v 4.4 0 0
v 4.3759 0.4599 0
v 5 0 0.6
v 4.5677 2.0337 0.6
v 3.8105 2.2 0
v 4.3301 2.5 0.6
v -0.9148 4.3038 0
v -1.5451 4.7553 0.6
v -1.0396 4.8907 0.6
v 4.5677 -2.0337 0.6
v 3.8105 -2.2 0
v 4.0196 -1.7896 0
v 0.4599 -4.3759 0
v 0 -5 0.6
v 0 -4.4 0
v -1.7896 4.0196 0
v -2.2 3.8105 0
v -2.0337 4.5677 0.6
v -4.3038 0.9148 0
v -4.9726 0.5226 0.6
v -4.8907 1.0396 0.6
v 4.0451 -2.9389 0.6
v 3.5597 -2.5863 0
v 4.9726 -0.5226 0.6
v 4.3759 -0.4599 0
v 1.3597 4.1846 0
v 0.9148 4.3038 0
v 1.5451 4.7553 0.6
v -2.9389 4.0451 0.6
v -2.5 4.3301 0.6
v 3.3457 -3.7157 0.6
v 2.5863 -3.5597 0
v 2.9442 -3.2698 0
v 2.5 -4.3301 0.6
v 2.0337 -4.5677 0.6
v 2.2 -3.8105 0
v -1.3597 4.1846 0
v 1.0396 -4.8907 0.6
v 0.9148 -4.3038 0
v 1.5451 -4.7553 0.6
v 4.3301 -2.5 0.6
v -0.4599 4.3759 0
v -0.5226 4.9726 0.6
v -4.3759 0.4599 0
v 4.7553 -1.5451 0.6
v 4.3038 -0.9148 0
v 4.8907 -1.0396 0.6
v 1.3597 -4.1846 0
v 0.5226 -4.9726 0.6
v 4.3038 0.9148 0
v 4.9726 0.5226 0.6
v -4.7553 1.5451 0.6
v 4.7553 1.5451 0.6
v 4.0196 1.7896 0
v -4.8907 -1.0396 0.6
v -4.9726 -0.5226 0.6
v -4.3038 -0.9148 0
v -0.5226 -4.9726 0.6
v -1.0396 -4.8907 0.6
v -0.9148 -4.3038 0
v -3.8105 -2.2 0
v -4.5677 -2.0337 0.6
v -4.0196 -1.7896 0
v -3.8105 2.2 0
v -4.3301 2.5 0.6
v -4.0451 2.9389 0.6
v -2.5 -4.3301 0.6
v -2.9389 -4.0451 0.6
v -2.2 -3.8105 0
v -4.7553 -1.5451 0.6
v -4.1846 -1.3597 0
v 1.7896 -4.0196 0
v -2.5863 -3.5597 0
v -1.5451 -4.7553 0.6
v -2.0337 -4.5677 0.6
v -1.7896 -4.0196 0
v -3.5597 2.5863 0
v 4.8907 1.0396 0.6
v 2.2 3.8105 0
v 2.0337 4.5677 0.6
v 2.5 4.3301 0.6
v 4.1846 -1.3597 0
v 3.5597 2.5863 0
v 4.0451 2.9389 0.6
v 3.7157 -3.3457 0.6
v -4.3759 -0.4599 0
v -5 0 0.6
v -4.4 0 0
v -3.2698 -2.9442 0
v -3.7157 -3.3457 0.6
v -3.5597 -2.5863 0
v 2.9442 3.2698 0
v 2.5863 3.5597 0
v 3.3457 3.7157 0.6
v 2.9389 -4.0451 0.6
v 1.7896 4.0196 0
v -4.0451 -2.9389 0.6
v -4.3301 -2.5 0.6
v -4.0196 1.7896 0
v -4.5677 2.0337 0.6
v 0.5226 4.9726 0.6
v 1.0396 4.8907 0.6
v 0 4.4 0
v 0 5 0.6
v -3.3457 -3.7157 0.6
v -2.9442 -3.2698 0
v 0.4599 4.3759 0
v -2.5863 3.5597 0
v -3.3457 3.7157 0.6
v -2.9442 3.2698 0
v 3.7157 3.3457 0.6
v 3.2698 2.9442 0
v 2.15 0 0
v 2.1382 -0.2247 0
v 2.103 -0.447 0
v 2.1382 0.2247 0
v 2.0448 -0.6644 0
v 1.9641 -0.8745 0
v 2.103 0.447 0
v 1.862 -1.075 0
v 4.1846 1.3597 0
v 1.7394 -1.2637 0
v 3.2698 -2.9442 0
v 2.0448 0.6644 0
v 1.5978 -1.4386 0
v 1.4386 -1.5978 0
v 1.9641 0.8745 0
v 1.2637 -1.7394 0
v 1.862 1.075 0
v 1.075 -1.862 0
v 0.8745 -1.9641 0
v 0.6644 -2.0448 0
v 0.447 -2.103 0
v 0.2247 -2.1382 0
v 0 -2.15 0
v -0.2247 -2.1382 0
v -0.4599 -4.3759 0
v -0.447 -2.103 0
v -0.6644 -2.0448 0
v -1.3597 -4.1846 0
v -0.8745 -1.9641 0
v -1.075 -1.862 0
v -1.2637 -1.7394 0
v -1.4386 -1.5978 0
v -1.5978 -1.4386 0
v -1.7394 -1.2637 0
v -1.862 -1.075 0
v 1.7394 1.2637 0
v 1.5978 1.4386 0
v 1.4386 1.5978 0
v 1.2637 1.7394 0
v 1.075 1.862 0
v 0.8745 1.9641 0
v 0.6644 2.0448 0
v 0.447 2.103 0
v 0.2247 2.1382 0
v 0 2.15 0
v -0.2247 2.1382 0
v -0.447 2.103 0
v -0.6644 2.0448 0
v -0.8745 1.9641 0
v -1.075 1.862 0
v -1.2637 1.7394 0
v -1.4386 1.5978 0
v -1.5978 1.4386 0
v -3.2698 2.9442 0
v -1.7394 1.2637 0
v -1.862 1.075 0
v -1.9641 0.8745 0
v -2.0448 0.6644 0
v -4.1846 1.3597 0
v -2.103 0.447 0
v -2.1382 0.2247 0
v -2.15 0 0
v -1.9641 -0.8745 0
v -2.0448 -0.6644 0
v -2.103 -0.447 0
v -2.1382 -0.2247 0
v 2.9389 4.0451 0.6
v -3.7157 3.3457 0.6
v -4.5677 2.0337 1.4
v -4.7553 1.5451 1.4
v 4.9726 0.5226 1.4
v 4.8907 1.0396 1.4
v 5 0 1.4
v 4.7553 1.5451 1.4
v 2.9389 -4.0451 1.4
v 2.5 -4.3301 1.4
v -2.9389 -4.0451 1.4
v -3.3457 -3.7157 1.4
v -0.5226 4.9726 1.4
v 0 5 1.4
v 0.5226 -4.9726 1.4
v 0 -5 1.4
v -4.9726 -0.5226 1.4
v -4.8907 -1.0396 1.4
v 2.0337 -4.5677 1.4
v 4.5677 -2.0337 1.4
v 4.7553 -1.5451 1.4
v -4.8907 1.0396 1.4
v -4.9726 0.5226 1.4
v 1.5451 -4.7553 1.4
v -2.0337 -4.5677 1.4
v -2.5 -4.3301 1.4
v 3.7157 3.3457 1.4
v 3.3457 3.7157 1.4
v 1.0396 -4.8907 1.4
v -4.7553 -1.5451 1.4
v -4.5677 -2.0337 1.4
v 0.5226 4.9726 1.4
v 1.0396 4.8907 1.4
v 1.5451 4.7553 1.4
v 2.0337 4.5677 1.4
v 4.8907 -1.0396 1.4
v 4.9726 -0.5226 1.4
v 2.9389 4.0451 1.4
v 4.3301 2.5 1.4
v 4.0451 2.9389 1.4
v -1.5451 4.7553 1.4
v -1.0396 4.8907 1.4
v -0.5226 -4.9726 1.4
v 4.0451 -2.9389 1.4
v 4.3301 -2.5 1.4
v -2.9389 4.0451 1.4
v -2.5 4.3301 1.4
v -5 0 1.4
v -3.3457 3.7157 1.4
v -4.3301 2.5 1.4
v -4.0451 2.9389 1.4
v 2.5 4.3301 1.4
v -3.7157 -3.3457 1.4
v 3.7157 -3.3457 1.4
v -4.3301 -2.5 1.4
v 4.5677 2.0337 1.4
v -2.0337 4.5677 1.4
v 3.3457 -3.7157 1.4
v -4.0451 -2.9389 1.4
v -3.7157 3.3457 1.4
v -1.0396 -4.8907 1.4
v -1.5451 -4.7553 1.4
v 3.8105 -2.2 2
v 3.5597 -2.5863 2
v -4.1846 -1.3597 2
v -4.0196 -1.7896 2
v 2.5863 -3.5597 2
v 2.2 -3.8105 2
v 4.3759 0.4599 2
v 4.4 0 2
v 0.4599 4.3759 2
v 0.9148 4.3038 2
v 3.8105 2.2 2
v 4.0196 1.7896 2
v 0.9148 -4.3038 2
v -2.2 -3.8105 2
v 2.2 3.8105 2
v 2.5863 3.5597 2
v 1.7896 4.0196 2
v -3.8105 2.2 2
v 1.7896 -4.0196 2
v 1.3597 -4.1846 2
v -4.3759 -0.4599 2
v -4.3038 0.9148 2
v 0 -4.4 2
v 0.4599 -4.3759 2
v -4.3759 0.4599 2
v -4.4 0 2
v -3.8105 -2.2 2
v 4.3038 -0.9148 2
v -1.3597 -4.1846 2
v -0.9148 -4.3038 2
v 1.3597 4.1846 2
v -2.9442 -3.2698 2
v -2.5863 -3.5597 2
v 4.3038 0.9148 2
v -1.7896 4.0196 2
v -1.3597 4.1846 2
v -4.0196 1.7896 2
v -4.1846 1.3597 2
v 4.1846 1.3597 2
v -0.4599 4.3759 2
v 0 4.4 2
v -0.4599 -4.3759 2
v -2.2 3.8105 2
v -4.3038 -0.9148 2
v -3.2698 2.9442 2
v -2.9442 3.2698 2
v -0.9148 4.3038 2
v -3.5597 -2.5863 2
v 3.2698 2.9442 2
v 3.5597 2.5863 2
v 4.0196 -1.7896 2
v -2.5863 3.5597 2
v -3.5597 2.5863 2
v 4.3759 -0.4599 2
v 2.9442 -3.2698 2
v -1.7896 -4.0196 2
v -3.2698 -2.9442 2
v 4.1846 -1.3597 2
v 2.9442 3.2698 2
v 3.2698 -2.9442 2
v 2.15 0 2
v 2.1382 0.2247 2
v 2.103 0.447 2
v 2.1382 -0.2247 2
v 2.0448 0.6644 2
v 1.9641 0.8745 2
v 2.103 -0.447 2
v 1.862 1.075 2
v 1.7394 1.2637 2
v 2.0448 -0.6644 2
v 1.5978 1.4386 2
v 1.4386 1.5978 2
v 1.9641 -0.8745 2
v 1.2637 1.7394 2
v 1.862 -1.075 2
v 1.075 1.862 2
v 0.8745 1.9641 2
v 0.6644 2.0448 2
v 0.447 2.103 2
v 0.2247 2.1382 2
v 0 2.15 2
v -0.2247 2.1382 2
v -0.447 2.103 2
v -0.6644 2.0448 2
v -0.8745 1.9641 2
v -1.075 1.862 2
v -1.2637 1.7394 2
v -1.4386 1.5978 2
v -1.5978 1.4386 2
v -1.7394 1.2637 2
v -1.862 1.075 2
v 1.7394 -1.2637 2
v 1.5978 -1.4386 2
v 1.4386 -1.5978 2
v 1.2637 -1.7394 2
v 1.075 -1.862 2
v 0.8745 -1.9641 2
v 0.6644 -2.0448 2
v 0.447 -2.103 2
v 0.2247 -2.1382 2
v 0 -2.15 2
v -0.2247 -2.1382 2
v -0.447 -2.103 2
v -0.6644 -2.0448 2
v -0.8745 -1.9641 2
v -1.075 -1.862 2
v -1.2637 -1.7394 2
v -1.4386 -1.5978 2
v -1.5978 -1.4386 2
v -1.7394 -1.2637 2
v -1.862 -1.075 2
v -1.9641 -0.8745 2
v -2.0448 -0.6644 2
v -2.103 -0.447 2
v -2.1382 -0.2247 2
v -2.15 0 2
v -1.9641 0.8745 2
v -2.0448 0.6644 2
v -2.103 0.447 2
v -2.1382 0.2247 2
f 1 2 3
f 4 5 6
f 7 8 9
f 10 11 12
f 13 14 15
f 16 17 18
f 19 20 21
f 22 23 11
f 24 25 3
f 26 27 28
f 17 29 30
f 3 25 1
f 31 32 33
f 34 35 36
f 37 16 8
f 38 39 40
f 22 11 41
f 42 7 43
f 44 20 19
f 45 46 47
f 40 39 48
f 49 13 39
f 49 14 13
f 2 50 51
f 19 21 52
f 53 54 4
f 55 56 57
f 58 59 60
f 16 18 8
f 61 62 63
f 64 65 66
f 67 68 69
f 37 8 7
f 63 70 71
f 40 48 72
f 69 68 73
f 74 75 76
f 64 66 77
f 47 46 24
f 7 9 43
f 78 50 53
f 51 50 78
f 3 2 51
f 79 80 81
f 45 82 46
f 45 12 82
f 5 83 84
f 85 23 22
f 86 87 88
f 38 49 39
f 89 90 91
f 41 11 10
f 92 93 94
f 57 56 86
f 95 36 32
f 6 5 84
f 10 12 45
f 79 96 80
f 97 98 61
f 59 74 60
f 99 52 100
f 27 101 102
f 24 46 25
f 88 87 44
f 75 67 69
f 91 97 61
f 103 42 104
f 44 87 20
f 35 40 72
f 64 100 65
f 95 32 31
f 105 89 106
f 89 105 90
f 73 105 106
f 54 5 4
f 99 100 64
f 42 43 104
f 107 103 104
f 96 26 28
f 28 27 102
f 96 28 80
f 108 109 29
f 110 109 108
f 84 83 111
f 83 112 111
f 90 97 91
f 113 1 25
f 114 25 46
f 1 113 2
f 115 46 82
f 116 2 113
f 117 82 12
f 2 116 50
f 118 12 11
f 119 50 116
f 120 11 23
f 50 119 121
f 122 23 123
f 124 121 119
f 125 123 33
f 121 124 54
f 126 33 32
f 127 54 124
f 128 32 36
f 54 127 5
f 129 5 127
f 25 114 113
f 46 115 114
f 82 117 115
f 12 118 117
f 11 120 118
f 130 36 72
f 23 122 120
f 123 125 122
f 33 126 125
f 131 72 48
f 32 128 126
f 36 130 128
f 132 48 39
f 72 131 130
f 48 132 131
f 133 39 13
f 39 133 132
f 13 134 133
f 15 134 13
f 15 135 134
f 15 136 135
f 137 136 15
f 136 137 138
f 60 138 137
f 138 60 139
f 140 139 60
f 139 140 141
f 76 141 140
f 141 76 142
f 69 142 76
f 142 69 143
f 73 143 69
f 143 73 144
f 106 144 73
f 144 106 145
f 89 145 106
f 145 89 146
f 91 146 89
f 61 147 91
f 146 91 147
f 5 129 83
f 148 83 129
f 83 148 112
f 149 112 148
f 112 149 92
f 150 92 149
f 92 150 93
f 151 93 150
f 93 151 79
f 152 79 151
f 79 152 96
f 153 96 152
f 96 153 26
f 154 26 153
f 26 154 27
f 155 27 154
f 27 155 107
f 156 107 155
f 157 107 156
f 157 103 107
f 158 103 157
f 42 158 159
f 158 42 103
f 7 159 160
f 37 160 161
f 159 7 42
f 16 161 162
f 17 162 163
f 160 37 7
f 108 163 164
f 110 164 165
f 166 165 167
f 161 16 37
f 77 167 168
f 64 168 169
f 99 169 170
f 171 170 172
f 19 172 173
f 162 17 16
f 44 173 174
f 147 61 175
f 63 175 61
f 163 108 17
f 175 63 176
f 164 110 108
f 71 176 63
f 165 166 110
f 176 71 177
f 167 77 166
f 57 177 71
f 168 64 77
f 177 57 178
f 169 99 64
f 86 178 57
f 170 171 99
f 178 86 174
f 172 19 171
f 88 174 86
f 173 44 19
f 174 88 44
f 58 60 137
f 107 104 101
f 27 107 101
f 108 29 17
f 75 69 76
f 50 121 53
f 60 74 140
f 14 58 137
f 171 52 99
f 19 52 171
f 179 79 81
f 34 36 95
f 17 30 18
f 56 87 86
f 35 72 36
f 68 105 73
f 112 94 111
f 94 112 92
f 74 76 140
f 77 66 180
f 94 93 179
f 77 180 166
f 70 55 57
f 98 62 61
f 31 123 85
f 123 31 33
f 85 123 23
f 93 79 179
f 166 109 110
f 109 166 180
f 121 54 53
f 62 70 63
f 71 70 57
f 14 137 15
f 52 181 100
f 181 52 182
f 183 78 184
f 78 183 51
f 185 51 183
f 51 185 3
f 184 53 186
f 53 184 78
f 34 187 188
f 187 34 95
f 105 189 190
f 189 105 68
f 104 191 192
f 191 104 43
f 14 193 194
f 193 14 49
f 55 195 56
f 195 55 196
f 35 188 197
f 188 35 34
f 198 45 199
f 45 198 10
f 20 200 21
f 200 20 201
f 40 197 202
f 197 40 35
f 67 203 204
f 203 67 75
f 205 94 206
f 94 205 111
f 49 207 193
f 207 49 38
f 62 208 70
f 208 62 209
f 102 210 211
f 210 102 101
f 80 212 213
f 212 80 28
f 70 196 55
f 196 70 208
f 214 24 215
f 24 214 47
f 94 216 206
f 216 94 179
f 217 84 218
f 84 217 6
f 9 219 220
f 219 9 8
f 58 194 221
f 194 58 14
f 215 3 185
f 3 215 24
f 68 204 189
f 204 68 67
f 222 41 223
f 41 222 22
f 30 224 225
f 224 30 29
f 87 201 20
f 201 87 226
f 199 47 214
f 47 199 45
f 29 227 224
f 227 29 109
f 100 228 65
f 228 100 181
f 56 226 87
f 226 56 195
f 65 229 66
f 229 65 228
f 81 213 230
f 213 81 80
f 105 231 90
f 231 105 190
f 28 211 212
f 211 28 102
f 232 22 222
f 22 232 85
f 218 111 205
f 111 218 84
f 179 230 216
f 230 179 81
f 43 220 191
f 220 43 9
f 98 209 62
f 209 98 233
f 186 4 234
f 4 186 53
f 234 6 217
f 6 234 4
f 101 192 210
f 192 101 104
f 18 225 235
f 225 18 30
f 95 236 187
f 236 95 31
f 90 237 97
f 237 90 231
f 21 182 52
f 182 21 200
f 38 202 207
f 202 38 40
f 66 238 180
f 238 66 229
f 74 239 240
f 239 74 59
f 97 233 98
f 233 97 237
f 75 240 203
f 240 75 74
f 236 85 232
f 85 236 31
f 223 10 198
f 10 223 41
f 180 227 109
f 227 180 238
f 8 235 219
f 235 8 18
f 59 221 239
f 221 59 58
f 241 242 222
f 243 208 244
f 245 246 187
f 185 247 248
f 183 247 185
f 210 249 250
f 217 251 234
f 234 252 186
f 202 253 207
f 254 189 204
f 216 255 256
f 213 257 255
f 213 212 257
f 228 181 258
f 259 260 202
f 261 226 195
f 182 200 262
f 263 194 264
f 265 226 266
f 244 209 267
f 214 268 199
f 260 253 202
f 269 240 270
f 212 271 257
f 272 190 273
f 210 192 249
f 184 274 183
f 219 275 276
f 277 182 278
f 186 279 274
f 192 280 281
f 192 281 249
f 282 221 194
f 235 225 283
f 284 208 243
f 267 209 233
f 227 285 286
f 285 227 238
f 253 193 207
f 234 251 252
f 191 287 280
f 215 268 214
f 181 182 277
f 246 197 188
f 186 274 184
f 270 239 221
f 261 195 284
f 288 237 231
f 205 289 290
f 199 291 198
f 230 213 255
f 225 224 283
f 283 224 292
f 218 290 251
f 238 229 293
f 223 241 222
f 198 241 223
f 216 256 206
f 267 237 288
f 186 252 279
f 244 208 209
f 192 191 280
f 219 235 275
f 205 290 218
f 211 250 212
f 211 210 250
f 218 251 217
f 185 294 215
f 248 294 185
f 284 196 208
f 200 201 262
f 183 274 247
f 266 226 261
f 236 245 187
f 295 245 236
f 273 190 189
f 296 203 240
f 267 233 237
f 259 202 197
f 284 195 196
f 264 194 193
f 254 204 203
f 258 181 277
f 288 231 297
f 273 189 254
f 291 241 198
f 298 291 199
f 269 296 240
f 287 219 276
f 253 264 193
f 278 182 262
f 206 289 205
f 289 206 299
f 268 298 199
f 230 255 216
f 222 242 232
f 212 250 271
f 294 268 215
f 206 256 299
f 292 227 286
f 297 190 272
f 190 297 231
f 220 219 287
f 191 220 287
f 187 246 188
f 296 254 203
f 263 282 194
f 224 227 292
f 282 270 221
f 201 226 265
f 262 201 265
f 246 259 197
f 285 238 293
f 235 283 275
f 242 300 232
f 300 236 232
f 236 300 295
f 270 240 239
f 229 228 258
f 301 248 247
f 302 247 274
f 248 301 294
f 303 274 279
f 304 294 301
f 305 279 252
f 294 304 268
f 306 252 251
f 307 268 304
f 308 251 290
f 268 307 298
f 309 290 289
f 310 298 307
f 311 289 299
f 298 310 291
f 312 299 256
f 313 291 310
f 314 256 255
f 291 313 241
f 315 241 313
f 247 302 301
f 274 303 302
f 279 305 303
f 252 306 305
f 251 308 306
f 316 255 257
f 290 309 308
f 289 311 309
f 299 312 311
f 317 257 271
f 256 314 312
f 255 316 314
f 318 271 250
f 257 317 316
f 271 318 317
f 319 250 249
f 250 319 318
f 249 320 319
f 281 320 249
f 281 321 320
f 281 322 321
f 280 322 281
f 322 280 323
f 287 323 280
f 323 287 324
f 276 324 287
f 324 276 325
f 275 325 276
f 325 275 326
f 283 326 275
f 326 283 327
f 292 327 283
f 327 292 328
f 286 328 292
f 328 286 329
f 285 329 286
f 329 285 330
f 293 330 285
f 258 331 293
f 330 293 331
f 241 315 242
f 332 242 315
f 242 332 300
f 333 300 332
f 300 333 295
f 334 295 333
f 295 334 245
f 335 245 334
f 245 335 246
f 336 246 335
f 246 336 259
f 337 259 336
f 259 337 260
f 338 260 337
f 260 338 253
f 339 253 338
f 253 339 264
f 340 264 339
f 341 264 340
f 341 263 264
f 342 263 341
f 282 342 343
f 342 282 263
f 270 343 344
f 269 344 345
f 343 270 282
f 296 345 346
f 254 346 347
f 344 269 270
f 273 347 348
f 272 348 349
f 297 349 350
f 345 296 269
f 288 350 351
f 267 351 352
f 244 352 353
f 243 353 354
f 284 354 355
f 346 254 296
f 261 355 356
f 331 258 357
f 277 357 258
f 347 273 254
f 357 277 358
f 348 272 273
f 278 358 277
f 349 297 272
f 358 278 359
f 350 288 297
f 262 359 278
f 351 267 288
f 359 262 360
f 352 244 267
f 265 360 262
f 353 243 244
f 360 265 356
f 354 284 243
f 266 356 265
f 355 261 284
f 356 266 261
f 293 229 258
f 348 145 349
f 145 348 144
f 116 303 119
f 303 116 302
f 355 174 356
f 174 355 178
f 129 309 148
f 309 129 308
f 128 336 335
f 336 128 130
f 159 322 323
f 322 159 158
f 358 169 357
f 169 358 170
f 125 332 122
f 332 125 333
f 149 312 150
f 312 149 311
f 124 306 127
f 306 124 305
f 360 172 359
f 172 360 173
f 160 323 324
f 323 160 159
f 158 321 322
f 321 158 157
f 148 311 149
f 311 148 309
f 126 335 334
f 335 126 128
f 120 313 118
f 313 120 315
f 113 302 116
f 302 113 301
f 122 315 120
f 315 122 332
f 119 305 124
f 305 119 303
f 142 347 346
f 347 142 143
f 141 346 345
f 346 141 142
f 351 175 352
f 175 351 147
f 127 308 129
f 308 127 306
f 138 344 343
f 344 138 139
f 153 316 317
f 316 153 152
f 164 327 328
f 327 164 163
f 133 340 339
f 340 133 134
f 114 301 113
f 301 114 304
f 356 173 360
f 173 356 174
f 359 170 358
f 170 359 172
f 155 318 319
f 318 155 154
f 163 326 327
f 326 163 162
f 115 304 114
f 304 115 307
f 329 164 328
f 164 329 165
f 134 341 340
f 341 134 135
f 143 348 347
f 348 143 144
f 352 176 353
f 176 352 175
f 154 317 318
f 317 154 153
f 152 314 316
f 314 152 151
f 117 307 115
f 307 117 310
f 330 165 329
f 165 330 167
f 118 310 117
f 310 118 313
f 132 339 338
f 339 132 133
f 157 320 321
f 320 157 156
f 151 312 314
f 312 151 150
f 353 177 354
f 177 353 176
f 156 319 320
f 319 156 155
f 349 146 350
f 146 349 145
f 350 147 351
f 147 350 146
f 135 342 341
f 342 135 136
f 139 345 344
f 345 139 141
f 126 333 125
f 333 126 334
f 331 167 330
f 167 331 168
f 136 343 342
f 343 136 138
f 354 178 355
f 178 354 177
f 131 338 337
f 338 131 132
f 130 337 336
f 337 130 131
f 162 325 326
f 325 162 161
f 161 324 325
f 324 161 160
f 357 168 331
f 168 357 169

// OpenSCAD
// Chamfered metric washer.
$fn = 60;
eps = 0.02;
inner_d = 4.3;
outer_d = 10;
thickness = 2;
chamfer = 0.6;
difference() {
    union() {
        cylinder(d1 = outer_d - 2 * chamfer, d2 = outer_d, h = chamfer);
        translate([0, 0, chamfer]) cylinder(d = outer_d, h = thickness - 2 * chamfer);
        translate([0, 0, thickness - chamfer]) cylinder(d1 = outer_d, d2 = outer_d - 2 * chamfer, h = chamfer);
    }
    translate([0, 0, -eps]) cylinder(d = inner_d, h = thickness + 2 * eps);
}
